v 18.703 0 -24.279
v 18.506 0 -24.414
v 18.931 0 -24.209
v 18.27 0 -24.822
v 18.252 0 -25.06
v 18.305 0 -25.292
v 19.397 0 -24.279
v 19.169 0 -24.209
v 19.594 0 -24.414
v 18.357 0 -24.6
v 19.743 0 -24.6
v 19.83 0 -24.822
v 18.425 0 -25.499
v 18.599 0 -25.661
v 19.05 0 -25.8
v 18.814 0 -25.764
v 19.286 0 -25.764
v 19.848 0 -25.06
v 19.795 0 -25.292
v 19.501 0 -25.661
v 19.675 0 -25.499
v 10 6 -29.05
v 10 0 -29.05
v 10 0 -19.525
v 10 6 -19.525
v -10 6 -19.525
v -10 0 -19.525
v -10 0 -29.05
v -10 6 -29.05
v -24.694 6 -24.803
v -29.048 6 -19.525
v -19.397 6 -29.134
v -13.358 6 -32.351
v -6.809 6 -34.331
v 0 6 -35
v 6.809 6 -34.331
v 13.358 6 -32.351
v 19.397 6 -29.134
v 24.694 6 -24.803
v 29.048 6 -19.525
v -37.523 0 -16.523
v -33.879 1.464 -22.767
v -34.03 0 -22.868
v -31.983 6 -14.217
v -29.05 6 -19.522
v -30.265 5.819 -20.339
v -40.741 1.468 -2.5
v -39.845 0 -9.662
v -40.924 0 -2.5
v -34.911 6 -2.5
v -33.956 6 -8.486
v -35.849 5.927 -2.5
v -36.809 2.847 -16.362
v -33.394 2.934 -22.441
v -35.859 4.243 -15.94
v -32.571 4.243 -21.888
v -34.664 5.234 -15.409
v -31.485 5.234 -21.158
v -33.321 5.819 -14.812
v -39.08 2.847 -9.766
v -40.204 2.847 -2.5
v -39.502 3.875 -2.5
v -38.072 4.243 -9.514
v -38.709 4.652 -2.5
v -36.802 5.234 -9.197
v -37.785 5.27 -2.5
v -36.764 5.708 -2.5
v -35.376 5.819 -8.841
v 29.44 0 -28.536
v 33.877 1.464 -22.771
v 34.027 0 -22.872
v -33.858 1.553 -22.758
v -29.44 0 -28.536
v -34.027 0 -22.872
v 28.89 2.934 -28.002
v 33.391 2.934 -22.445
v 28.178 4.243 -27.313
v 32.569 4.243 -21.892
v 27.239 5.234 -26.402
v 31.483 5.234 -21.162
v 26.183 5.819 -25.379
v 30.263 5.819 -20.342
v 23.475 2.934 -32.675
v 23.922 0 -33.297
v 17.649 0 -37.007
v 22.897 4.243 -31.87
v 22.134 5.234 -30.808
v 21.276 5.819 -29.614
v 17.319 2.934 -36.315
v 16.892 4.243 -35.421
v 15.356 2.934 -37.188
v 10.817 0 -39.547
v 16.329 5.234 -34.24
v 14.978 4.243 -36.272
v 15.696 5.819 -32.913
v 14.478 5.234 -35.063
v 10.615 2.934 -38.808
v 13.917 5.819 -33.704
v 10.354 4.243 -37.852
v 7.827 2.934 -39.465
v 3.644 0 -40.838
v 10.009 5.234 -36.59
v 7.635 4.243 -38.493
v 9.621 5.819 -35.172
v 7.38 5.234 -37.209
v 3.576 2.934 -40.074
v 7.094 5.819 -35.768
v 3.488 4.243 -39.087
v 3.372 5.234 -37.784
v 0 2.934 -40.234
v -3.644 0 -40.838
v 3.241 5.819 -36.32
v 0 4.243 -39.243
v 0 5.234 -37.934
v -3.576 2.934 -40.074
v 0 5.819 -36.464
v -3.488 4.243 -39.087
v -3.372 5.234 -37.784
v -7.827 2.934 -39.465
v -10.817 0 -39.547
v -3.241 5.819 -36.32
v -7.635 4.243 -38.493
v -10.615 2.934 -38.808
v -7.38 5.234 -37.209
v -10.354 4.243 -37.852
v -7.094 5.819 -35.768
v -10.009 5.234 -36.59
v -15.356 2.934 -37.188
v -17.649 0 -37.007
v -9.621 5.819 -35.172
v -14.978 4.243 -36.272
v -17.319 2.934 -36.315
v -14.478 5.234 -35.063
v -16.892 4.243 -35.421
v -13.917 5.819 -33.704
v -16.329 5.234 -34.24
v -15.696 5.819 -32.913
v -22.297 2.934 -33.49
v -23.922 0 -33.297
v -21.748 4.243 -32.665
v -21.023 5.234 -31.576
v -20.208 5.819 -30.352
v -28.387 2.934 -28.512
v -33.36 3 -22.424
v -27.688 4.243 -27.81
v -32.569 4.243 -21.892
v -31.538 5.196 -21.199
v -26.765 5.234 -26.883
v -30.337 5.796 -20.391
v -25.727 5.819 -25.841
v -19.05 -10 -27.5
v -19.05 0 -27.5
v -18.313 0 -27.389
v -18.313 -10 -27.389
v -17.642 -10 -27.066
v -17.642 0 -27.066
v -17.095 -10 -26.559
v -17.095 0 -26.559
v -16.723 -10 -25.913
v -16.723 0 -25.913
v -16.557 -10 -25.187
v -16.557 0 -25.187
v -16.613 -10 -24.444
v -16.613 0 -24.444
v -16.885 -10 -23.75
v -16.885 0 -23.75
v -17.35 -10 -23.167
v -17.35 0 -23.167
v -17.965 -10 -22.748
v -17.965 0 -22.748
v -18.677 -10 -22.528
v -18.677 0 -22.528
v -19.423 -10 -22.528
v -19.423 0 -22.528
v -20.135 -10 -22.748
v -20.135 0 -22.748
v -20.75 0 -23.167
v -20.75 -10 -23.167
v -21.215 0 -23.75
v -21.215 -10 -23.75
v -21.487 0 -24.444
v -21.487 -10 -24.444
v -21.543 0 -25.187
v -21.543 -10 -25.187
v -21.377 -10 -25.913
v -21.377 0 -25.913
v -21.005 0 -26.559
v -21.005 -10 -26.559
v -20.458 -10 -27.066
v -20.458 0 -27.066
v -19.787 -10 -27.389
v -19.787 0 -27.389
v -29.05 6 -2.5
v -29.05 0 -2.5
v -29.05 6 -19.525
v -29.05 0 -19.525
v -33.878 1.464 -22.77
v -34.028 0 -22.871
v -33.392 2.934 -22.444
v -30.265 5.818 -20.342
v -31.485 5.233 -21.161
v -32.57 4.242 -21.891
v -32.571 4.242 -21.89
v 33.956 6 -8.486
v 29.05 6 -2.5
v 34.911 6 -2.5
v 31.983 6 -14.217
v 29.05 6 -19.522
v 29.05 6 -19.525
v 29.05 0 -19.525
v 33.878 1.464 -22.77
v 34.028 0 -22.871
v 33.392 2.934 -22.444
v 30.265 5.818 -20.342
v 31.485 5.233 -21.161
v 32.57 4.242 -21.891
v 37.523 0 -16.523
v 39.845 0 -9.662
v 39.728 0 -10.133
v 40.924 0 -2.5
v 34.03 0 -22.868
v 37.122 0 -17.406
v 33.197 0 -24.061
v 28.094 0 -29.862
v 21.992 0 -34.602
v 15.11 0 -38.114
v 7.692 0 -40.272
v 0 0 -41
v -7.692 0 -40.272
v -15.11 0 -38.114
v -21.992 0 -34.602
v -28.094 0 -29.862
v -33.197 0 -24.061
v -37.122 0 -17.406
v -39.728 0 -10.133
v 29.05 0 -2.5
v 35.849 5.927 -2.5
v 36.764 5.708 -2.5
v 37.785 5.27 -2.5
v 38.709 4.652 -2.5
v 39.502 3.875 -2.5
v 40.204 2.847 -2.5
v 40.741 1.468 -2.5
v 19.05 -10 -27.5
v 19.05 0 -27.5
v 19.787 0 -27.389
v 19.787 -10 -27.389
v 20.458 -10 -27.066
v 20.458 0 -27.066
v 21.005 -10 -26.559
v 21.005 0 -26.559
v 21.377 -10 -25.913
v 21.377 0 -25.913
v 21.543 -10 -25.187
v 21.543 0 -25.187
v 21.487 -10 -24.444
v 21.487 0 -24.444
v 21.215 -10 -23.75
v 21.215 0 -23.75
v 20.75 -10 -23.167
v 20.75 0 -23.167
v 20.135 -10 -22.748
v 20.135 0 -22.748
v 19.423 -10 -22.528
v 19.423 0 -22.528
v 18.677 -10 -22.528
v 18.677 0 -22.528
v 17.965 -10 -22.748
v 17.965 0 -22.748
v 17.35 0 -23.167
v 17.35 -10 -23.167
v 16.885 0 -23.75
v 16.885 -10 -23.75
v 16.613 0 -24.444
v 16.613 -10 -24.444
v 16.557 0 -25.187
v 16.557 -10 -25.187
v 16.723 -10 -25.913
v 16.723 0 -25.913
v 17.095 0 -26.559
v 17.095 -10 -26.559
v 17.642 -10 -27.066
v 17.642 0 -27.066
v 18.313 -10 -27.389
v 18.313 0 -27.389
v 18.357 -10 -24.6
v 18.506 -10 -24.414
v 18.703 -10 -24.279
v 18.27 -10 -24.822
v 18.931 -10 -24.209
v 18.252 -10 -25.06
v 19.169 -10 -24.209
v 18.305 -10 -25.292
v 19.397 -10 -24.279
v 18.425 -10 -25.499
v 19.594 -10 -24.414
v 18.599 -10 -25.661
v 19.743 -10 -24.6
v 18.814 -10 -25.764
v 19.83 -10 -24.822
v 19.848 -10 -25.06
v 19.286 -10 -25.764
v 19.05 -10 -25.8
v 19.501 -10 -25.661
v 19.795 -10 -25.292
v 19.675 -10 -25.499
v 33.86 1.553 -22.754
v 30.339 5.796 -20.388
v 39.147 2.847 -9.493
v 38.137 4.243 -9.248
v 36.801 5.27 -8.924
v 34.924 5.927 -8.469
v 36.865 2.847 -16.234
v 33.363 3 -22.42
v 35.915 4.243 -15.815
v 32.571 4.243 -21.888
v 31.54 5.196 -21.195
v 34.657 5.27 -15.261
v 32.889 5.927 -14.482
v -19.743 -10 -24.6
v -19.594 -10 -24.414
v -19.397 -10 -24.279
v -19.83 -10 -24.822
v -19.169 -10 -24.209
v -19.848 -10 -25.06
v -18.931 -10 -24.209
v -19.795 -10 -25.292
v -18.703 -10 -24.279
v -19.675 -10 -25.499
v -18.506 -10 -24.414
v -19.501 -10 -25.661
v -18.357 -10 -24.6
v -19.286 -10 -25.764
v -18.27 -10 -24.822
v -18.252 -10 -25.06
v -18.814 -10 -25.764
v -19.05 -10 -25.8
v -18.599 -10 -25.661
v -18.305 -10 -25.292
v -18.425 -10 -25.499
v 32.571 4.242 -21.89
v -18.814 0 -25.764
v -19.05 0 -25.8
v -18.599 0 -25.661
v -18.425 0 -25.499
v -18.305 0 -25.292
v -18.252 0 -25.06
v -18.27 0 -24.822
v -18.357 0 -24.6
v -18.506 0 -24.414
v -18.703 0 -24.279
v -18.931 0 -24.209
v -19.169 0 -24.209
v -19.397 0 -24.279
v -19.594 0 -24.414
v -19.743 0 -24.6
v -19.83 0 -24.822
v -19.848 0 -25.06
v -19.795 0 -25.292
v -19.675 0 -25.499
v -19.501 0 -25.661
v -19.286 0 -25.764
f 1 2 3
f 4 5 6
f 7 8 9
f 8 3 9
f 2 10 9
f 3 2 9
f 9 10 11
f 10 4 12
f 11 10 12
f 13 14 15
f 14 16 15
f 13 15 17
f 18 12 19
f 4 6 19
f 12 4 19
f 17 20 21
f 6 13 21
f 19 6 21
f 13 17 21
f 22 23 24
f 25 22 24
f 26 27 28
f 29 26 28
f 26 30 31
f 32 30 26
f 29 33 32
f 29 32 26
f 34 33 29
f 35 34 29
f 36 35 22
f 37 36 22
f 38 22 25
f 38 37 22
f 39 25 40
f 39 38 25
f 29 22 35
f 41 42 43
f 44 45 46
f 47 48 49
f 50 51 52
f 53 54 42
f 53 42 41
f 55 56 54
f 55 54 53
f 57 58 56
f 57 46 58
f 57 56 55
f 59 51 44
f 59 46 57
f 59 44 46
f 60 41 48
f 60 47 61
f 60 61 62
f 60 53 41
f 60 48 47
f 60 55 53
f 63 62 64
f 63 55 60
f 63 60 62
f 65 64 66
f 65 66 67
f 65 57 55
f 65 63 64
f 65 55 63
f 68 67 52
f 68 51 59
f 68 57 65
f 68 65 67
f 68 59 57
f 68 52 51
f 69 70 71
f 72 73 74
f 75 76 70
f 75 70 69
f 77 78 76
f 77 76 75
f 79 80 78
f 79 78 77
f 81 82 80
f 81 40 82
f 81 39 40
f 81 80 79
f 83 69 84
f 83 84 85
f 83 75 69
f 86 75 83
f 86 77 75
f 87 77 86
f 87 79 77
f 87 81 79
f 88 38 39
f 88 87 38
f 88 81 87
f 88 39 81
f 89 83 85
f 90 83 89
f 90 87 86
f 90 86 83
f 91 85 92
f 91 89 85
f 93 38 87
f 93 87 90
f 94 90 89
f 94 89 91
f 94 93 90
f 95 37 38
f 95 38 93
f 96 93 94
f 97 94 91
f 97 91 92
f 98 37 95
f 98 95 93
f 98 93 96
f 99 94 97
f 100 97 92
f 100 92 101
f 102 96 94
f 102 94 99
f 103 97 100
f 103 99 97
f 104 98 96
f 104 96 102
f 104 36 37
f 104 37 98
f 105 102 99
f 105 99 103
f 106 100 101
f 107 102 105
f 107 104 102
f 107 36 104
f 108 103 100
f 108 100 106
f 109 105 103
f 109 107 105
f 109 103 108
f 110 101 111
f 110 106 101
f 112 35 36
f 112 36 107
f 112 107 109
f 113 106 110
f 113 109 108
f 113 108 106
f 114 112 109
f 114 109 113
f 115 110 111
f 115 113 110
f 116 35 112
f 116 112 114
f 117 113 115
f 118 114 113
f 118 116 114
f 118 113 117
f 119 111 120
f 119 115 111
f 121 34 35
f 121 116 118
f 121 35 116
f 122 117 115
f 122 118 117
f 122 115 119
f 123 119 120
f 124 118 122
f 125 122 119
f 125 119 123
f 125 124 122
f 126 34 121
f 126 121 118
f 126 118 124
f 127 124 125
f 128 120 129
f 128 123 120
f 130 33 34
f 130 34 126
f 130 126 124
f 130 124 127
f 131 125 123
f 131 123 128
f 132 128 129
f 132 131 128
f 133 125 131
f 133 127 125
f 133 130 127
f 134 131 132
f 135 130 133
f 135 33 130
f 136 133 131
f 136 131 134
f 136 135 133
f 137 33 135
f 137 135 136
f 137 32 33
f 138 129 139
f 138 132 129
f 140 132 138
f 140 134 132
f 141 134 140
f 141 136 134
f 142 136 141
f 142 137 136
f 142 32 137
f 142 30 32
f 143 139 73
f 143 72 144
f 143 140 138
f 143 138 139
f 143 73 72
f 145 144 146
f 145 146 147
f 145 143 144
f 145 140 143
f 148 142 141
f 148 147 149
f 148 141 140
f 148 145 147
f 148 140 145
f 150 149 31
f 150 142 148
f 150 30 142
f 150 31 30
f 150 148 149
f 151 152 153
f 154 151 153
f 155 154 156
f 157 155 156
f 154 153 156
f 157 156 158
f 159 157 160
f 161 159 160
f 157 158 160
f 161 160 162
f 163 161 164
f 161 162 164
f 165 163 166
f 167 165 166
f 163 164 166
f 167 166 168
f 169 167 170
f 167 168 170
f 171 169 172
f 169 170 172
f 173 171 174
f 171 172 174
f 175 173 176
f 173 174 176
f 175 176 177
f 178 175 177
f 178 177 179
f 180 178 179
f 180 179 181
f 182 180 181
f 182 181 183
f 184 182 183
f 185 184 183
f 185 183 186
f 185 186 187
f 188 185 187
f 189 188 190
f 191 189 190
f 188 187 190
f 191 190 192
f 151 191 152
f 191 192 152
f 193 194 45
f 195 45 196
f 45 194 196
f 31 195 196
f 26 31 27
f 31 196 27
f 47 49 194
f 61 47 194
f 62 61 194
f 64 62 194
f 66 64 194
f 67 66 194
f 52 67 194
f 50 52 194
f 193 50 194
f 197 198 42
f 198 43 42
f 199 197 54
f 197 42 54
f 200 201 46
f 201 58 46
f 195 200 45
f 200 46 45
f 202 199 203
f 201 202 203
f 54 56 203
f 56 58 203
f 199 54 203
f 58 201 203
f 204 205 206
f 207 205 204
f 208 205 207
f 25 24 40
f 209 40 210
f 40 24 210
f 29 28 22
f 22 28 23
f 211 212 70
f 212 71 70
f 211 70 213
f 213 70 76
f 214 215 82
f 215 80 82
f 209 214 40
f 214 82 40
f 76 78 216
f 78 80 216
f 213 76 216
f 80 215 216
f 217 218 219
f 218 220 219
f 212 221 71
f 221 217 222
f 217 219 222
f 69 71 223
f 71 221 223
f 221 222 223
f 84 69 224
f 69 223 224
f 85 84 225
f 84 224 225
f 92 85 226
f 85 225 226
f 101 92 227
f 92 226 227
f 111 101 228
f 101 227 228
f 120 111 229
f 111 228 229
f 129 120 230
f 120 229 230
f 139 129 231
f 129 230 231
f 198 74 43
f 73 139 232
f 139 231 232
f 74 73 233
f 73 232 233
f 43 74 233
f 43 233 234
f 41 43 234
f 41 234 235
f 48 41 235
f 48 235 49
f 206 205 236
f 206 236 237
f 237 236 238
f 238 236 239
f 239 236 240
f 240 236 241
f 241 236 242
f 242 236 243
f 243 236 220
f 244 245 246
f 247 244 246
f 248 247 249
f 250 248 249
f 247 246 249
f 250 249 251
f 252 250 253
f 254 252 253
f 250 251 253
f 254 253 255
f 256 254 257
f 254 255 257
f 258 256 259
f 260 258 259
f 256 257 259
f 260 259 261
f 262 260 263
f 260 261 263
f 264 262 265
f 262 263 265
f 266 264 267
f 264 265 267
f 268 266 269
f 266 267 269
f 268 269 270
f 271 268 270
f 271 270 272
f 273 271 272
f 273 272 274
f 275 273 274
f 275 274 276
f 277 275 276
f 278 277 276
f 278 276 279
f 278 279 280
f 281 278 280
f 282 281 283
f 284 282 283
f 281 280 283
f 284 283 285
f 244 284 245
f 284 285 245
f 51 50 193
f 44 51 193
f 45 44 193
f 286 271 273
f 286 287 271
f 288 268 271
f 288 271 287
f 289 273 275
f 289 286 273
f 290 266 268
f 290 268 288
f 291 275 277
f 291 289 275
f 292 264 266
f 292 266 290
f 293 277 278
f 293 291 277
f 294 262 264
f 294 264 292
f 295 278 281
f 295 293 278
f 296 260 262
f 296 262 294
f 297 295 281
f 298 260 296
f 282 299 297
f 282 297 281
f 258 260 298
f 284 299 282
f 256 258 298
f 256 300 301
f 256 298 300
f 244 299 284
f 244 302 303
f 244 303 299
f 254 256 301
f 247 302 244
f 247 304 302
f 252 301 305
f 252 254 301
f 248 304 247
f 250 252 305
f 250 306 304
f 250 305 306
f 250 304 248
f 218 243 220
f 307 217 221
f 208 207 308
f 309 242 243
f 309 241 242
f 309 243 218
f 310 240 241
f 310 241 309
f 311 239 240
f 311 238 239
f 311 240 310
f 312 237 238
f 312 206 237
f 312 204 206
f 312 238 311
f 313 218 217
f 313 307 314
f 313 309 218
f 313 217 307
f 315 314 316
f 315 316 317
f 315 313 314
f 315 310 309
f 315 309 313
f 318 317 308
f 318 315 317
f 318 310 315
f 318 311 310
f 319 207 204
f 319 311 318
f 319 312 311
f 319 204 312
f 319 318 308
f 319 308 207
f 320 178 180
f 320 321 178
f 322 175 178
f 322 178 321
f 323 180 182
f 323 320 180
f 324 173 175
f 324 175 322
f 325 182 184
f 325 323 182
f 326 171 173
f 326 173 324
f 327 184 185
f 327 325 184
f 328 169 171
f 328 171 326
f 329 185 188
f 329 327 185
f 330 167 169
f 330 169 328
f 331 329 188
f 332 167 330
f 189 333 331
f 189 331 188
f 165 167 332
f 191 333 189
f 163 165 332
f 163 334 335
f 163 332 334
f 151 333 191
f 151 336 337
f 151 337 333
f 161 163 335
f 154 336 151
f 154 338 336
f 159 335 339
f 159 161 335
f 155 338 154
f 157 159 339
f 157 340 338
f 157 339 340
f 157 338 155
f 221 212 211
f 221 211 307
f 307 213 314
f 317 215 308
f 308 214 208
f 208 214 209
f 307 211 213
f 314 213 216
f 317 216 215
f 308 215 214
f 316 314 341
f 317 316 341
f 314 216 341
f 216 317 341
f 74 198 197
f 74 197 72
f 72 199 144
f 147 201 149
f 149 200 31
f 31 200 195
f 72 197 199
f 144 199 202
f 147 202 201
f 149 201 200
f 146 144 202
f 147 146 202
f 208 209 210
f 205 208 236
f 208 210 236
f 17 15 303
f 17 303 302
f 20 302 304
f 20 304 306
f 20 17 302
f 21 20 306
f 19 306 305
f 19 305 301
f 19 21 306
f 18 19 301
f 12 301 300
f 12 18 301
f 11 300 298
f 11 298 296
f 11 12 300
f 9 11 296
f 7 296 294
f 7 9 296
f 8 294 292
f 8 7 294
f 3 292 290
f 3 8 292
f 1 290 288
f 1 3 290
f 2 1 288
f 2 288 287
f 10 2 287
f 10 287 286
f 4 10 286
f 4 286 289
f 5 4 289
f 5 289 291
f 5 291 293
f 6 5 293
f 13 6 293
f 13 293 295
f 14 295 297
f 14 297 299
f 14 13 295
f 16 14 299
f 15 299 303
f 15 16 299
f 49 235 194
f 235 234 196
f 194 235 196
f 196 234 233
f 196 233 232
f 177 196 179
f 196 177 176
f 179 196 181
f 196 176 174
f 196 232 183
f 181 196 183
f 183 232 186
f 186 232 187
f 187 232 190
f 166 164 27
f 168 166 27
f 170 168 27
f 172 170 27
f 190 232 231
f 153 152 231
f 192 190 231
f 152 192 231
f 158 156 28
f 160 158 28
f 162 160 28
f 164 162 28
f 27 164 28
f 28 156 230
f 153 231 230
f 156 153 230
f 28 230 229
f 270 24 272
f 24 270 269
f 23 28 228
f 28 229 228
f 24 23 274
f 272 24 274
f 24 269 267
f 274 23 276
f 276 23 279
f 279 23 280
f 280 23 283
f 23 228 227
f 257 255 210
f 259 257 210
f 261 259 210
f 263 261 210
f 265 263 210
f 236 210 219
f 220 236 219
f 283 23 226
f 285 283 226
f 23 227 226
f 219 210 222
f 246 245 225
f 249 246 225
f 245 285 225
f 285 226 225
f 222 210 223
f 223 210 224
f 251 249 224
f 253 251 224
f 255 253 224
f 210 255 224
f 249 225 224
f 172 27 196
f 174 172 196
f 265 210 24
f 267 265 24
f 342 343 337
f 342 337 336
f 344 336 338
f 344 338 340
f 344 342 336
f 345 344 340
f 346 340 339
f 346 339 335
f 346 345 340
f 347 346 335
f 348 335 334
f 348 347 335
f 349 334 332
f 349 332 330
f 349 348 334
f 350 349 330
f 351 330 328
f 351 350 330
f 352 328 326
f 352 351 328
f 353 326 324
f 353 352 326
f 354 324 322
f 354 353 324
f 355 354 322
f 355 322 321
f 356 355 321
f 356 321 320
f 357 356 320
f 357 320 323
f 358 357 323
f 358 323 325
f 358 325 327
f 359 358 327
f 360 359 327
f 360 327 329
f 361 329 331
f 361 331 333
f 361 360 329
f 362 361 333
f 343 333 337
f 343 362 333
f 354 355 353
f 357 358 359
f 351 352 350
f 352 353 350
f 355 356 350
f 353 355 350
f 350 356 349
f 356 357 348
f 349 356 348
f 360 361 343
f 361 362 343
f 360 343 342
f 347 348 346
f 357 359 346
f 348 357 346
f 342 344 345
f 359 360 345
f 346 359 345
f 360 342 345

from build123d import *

# Parameters (mm, degrees)
BOSS_EXTRUDE1_DEPTH = 6
FILLET1_R           = 6
SKETCH2_R           = 2.5
SKETCH2_R_2         = 0.8
BOSS_EXTRUDE2_DEPTH = 10


with BuildPart() as part:
    # Sketch1 → Boss-Extrude1 (new body)
    with BuildSketch(Plane(origin=(0, 0, 0), x_dir=(1, 0, 0), z_dir=(0, 1, 0))):
        with BuildLine():
            Line((-40.923709509, 2.5), (-29.05, 2.5))
            Line((-29.05, 2.5), (-29.05, 19.525))
            Line((-29.05, 19.525), (-10, 19.525))
            Line((-10, 19.525), (-10, 29.05))
            Line((-10, 29.05), (10, 29.05))
            Line((10, 29.05), (10, 19.525))
            Line((10, 19.525), (29.05, 19.525))
            Line((29.05, 19.525), (29.05, 2.5))
            Line((29.05, 2.5), (40.923709509, 2.5))
            ThreePointArc((40.923709509, 2.5), (0, 41), (-40.923709509, 2.5))
        make_face()
    extrude(amount=BOSS_EXTRUDE1_DEPTH)

    # Fillet1
    fillet1_edges = [part.edges().sort_by_distance(p)[0] for p in [
        (0, 6, -41),
    ]]
    fillet(fillet1_edges, radius=FILLET1_R - 0.0001)  # a hair under: the kernel refuses the full size

    # Sketch2 → Boss-Extrude2 (add)
    # profile 1 of 2: a face of its own
    with BuildSketch(Plane.XZ):
        with Locations(Location((19.05, -25, 0), (0, 0, 270))):
            Circle(SKETCH2_R)
        with Locations(Location((19.05, -25, 0), (0, 0, 270))):
            Circle(SKETCH2_R_2, mode=Mode.SUBTRACT)
    # profile 2 of 2: a face of its own
    with BuildSketch(Plane.XZ):
        with Locations(Location((-19.05, -25, 0), (0, 0, 270))):
            Circle(SKETCH2_R)
        with Locations(Location((-19.05, -25, 0), (0, 0, 270))):
            Circle(SKETCH2_R_2, mode=Mode.SUBTRACT)
    extrude(amount=BOSS_EXTRUDE2_DEPTH)


solid = part.part
